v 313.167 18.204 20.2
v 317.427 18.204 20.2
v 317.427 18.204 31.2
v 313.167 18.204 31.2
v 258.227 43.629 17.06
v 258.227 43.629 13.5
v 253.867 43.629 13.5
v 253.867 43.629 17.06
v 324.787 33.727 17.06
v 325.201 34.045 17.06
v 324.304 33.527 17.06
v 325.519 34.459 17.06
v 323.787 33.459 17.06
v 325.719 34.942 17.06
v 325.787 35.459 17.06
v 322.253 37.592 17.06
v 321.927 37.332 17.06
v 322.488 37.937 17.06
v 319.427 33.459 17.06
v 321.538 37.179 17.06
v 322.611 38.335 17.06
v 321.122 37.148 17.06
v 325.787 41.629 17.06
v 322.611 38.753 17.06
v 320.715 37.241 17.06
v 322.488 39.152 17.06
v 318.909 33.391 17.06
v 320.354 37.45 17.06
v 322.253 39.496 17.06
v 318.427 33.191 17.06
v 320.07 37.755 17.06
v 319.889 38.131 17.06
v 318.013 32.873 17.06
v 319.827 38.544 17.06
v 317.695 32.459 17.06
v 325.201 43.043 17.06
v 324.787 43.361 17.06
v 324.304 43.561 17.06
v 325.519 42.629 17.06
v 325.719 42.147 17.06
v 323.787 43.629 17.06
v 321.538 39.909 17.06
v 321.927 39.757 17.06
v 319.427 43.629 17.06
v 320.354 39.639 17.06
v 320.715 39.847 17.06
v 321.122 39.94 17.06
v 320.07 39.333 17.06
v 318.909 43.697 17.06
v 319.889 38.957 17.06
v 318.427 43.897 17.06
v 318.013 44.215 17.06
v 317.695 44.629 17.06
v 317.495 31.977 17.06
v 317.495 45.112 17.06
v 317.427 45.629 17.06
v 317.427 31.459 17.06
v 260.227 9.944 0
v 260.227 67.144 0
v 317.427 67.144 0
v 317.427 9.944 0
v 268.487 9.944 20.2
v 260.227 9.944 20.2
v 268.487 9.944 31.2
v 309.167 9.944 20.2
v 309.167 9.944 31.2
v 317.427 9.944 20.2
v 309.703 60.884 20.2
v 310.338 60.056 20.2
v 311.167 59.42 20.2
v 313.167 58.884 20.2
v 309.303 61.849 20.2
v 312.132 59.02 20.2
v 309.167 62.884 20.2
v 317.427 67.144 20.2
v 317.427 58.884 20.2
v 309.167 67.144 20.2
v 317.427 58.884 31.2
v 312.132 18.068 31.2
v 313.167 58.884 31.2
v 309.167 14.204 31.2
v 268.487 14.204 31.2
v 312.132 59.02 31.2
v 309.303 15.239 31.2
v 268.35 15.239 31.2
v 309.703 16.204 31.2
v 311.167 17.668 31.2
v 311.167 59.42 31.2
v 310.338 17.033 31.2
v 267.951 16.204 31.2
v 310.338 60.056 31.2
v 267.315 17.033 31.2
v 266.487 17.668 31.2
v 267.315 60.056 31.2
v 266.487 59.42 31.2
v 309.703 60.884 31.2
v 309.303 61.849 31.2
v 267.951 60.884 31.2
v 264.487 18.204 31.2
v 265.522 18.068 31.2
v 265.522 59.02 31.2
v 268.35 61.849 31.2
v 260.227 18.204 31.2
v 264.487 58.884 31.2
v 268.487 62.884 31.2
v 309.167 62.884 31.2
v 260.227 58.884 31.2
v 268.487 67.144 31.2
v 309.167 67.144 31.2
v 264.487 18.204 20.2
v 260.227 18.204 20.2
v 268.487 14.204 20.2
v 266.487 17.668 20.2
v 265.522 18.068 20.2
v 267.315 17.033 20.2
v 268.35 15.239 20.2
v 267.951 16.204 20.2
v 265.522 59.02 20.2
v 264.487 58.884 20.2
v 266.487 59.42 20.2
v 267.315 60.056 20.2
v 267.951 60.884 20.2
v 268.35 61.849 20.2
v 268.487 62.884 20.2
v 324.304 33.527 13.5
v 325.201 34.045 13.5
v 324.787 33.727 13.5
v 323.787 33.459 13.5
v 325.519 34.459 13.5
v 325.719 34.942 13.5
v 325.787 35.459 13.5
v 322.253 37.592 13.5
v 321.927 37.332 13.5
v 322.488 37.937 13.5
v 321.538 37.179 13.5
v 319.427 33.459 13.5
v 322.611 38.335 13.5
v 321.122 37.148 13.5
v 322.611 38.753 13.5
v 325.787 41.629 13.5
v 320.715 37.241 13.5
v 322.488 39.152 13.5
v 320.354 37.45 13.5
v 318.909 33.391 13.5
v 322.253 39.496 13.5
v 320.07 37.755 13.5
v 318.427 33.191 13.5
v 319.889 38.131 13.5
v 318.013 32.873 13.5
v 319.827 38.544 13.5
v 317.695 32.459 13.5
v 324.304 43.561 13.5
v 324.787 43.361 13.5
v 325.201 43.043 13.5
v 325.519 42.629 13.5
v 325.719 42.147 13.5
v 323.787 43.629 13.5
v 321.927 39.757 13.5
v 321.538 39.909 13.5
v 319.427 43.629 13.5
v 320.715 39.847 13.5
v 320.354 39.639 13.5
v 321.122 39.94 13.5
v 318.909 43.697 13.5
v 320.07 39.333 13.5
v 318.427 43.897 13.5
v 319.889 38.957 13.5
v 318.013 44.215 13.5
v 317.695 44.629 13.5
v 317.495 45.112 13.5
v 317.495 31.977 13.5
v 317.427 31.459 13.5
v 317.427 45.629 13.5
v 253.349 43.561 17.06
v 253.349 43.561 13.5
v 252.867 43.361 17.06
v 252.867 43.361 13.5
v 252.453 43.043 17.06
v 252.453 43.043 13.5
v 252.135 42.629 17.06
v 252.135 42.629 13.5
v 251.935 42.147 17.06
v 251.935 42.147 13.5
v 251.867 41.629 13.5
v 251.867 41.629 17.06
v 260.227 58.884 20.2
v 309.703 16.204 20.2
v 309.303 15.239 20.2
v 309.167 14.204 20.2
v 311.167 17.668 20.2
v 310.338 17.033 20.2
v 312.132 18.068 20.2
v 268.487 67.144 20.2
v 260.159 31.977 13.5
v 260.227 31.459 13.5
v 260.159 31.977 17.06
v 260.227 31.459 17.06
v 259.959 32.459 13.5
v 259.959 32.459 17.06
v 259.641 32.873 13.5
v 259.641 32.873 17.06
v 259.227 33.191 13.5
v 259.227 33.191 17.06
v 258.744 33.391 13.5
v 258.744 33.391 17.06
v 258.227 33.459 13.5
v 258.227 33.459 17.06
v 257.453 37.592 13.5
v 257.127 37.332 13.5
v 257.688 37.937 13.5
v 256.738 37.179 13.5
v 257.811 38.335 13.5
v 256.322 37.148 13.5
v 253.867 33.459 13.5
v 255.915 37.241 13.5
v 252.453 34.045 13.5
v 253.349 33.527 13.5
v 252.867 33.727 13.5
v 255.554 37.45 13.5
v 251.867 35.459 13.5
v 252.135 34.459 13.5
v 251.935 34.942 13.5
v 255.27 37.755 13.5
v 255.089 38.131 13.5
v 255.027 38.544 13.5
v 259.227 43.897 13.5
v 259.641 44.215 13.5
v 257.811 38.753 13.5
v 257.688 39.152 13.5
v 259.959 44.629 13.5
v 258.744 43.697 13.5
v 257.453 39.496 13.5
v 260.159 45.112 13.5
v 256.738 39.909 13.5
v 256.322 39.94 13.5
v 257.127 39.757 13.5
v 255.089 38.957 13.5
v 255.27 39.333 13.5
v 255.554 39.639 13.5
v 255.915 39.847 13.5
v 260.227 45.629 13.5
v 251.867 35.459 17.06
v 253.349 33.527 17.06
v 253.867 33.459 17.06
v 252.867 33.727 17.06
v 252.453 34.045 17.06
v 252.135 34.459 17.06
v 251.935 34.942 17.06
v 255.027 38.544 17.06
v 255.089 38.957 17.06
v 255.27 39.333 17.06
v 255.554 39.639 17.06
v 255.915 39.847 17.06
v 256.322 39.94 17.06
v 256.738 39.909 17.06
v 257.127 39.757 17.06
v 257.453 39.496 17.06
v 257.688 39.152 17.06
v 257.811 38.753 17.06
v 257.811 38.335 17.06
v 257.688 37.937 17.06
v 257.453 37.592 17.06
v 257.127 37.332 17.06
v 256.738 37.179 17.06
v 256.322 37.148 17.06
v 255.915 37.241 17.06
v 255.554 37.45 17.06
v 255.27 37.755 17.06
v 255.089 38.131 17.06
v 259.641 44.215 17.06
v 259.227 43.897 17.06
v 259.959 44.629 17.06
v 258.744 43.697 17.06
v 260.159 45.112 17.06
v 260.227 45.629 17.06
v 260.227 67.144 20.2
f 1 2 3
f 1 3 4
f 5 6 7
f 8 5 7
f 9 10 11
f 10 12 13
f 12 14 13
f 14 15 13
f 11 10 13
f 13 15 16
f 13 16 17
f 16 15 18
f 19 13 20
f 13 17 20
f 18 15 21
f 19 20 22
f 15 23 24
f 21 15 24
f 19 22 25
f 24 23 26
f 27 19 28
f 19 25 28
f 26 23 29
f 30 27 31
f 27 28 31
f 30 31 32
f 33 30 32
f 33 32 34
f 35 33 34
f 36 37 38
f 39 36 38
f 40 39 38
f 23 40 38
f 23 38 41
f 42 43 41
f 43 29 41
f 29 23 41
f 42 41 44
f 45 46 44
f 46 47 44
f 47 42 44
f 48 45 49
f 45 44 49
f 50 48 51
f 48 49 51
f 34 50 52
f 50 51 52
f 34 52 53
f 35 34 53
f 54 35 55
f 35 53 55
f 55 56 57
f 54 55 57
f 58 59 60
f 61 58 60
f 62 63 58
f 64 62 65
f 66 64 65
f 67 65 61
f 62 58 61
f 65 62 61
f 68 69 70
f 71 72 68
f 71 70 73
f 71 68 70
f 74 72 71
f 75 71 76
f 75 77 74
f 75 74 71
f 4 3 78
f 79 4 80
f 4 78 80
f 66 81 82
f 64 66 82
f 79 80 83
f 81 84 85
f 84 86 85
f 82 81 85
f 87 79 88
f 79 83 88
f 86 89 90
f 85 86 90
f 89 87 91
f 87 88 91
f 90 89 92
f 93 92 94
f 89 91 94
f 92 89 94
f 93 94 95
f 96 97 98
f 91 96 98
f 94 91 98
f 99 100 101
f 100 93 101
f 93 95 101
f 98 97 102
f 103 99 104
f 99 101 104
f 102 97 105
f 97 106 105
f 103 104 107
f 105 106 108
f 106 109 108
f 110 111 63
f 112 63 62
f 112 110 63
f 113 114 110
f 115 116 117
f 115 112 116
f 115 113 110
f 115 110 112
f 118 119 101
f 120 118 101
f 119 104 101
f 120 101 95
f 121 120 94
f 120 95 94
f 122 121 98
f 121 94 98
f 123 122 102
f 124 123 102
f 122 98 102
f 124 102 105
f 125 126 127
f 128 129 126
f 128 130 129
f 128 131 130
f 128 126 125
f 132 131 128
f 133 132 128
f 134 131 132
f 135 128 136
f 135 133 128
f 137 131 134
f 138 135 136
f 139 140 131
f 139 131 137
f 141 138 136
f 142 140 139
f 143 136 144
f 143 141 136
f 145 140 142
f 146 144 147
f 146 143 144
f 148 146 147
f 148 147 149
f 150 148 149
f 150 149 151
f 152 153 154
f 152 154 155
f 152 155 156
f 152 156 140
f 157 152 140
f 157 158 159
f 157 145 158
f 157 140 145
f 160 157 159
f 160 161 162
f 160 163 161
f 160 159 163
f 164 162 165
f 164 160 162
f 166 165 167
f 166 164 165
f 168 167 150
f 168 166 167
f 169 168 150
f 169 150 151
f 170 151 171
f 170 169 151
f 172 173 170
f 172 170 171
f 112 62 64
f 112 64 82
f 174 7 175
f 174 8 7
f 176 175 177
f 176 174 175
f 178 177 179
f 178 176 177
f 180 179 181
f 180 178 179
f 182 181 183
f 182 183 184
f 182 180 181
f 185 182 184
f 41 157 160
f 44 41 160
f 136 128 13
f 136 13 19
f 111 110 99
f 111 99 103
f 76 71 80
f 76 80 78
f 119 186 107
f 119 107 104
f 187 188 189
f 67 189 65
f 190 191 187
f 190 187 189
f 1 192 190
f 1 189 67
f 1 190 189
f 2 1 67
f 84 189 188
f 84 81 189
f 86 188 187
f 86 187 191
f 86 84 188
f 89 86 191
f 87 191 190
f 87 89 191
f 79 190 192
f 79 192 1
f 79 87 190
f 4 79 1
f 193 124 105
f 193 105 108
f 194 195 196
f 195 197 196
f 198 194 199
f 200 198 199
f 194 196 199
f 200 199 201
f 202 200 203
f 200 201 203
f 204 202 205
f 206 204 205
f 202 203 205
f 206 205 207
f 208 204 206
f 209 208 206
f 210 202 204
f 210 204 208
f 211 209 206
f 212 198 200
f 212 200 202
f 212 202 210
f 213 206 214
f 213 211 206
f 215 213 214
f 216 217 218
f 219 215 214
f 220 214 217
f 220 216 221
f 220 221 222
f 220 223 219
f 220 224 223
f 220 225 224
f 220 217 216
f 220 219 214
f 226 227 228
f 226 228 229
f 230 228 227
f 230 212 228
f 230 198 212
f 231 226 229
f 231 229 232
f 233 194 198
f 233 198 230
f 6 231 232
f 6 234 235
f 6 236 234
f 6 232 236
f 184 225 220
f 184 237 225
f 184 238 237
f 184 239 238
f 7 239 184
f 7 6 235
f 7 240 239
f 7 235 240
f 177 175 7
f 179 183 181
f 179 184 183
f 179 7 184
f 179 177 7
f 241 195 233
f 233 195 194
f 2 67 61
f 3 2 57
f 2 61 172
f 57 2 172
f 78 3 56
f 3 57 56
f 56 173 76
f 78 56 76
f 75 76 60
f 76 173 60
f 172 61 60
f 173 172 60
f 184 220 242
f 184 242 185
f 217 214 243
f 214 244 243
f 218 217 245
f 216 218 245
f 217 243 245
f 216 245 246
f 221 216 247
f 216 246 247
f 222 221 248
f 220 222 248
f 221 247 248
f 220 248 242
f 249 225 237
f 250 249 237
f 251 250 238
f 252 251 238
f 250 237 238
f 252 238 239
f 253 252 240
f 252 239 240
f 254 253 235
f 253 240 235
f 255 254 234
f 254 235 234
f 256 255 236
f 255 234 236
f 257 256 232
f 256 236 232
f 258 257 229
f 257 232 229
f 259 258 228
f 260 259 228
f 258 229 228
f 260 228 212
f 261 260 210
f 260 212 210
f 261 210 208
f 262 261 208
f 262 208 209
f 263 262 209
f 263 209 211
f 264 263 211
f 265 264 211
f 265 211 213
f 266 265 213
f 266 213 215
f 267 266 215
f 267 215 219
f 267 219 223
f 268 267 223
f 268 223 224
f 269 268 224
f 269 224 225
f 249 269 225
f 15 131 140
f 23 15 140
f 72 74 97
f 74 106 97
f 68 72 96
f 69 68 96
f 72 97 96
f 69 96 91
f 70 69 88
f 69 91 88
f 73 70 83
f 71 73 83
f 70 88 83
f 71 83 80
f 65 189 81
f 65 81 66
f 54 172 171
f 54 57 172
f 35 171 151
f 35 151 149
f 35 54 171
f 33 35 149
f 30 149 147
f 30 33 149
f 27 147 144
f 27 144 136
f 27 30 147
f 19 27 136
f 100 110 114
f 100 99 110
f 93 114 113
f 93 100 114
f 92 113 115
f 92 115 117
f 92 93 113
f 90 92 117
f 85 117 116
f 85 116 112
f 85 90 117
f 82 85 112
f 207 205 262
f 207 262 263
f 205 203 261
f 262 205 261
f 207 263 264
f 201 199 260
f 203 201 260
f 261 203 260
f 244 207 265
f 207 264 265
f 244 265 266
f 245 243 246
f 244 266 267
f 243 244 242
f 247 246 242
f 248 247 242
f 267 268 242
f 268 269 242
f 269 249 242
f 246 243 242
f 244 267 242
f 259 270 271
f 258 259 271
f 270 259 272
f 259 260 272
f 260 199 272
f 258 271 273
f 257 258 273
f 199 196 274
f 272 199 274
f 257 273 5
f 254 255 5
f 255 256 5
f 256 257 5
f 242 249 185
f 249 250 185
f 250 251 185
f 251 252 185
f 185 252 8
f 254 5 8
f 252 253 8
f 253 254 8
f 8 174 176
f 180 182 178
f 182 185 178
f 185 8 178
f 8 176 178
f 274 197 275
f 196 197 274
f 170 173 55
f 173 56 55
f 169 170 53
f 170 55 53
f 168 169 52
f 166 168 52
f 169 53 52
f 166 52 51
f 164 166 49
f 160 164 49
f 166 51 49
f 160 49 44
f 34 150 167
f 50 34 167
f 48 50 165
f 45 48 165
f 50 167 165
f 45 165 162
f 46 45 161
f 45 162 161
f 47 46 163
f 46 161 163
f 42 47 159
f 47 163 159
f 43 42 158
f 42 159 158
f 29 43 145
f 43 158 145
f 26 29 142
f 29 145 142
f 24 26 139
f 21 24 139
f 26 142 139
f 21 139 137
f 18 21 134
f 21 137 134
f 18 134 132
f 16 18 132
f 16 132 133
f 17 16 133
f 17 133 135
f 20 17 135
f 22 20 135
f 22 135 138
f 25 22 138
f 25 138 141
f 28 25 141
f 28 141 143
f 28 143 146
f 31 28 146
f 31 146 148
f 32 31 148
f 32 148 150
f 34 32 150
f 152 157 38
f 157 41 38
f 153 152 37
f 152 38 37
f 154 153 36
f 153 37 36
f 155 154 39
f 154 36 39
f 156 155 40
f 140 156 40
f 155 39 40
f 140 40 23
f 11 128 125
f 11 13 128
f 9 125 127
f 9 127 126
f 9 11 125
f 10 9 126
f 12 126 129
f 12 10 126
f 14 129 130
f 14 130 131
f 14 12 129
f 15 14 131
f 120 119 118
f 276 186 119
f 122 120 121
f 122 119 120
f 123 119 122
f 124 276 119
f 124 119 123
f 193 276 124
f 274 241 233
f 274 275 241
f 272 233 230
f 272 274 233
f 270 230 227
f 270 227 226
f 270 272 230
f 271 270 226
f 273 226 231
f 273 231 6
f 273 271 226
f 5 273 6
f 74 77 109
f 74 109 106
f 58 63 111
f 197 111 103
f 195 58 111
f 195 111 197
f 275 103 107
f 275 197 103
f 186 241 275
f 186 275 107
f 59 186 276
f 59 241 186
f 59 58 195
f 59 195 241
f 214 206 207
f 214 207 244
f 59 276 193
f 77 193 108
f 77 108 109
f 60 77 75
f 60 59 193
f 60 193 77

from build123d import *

# Parameters (mm, degrees)
SKETCH_1_W          = 57.2
SKETCH_1_H          = 57.2
EXTRUDE_1_DEPTH     = 20.2
EXTRUDE_2_DEPTH     = 11
FILLET_1_R          = 4
SKETCH_3_W          = 8.36
SKETCH_3_H          = 10.17
EXTRUDE_3_DEPTH     = 3.56
FILLET_2_R          = 2
CUT_EXTRUDE_1_REACH = 335.105
SKETCH_4_R          = 1.4


with BuildPart() as part:
    # 草图1 → 凸台-拉伸1 (new body)
    with BuildSketch(Plane.XY):
        with Locations((288.826790697, 38.544140377)):
            Rectangle(SKETCH_1_W, SKETCH_1_H)
    extrude(amount=EXTRUDE_1_DEPTH)

    # 草图2 → 凸台-拉伸2 (add)
    with BuildSketch(Plane.XY.offset(20.2)):
        Polygon((260.226790697, 58.884140377), (268.486790697, 58.884140377), (268.486790697, 67.144140377), (309.166790697, 67.144140377), (309.166790697, 58.884140377), (317.426790697, 58.884140377), (317.426790697, 18.204140377), (309.166790697, 18.204140377), (309.166790697, 9.944140377), (268.486790697, 9.944140377), (268.486790697, 18.204140377), (260.226790697, 18.204140377), align=None)
    extrude(amount=EXTRUDE_2_DEPTH)

    # 圆角1
    fillet_1_edges = [part.edges().sort_by_distance(p)[0] for p in [
        (268.486790697, 58.884140377, 25.7),
        (268.486790697, 18.204140377, 25.7),
        (309.166790697, 18.204140377, 25.7),
        (309.166790697, 58.884140377, 25.7),
    ]]
    fillet(fillet_1_edges, radius=FILLET_1_R)

    # 草图3 → 凸台-拉伸3 (add)
    with BuildSketch(Plane(origin=(0, 0, 13.5), x_dir=(-1, 0, 0), z_dir=(0, 0, -1))):
        with Locations((-256.046790697, 38.544140377)):
            Rectangle(SKETCH_3_W, SKETCH_3_H)
        with Locations((-321.606790697, 38.544140377)):
            Rectangle(SKETCH_3_W, SKETCH_3_H)
    extrude(amount=-EXTRUDE_3_DEPTH)

    # 圆角2
    fillet_2_edges = [part.edges().sort_by_distance(p)[0] for p in [
        (251.866790697, 43.629140377, 15.28),
        (251.866790697, 33.459140377, 15.28),
        (260.226790697, 33.459140377, 15.28),
        (260.226790697, 43.629140377, 15.28),
        (317.426790697, 43.629140377, 15.28),
        (317.426790697, 33.459140377, 15.28),
        (325.786790697, 33.459140377, 15.28),
        (325.786790697, 43.629140377, 15.28),
    ]]
    fillet(fillet_2_edges, radius=FILLET_2_R)

    # 草图4 → 切除-拉伸1 (cut, up to next)
    with BuildSketch(Plane(origin=(0, 0, 13.5), x_dir=(-1, 0, 0), z_dir=(0, 0, -1)), mode=Mode.PRIVATE) as cut_extrude_1_sk1:
        with Locations((-256.426790697, 38.544140377)):
            Circle(SKETCH_4_R)
    cut_extrude_1_tool1 = extrude(cut_extrude_1_sk1.sketch, amount=-CUT_EXTRUDE_1_REACH, mode=Mode.PRIVATE) & part.part
    # 草图4 → 切除-拉伸1 (cut, up to next)
    with BuildSketch(Plane(origin=(0, 0, 13.5), x_dir=(-1, 0, 0), z_dir=(0, 0, -1)), mode=Mode.PRIVATE) as cut_extrude_1_sk2:
        with Locations((-321.226790697, 38.544140377)):
            Circle(SKETCH_4_R)
    cut_extrude_1_tool2 = extrude(cut_extrude_1_sk2.sketch, amount=-CUT_EXTRUDE_1_REACH, mode=Mode.PRIVATE) & part.part
    add(cut_extrude_1_tool1.solids().sort_by_distance((256.426791, 38.54414, 13.5))[0], mode=Mode.SUBTRACT)
    add(cut_extrude_1_tool2.solids().sort_by_distance((321.226791, 38.54414, 13.5))[0], mode=Mode.SUBTRACT)


solid = part.part
